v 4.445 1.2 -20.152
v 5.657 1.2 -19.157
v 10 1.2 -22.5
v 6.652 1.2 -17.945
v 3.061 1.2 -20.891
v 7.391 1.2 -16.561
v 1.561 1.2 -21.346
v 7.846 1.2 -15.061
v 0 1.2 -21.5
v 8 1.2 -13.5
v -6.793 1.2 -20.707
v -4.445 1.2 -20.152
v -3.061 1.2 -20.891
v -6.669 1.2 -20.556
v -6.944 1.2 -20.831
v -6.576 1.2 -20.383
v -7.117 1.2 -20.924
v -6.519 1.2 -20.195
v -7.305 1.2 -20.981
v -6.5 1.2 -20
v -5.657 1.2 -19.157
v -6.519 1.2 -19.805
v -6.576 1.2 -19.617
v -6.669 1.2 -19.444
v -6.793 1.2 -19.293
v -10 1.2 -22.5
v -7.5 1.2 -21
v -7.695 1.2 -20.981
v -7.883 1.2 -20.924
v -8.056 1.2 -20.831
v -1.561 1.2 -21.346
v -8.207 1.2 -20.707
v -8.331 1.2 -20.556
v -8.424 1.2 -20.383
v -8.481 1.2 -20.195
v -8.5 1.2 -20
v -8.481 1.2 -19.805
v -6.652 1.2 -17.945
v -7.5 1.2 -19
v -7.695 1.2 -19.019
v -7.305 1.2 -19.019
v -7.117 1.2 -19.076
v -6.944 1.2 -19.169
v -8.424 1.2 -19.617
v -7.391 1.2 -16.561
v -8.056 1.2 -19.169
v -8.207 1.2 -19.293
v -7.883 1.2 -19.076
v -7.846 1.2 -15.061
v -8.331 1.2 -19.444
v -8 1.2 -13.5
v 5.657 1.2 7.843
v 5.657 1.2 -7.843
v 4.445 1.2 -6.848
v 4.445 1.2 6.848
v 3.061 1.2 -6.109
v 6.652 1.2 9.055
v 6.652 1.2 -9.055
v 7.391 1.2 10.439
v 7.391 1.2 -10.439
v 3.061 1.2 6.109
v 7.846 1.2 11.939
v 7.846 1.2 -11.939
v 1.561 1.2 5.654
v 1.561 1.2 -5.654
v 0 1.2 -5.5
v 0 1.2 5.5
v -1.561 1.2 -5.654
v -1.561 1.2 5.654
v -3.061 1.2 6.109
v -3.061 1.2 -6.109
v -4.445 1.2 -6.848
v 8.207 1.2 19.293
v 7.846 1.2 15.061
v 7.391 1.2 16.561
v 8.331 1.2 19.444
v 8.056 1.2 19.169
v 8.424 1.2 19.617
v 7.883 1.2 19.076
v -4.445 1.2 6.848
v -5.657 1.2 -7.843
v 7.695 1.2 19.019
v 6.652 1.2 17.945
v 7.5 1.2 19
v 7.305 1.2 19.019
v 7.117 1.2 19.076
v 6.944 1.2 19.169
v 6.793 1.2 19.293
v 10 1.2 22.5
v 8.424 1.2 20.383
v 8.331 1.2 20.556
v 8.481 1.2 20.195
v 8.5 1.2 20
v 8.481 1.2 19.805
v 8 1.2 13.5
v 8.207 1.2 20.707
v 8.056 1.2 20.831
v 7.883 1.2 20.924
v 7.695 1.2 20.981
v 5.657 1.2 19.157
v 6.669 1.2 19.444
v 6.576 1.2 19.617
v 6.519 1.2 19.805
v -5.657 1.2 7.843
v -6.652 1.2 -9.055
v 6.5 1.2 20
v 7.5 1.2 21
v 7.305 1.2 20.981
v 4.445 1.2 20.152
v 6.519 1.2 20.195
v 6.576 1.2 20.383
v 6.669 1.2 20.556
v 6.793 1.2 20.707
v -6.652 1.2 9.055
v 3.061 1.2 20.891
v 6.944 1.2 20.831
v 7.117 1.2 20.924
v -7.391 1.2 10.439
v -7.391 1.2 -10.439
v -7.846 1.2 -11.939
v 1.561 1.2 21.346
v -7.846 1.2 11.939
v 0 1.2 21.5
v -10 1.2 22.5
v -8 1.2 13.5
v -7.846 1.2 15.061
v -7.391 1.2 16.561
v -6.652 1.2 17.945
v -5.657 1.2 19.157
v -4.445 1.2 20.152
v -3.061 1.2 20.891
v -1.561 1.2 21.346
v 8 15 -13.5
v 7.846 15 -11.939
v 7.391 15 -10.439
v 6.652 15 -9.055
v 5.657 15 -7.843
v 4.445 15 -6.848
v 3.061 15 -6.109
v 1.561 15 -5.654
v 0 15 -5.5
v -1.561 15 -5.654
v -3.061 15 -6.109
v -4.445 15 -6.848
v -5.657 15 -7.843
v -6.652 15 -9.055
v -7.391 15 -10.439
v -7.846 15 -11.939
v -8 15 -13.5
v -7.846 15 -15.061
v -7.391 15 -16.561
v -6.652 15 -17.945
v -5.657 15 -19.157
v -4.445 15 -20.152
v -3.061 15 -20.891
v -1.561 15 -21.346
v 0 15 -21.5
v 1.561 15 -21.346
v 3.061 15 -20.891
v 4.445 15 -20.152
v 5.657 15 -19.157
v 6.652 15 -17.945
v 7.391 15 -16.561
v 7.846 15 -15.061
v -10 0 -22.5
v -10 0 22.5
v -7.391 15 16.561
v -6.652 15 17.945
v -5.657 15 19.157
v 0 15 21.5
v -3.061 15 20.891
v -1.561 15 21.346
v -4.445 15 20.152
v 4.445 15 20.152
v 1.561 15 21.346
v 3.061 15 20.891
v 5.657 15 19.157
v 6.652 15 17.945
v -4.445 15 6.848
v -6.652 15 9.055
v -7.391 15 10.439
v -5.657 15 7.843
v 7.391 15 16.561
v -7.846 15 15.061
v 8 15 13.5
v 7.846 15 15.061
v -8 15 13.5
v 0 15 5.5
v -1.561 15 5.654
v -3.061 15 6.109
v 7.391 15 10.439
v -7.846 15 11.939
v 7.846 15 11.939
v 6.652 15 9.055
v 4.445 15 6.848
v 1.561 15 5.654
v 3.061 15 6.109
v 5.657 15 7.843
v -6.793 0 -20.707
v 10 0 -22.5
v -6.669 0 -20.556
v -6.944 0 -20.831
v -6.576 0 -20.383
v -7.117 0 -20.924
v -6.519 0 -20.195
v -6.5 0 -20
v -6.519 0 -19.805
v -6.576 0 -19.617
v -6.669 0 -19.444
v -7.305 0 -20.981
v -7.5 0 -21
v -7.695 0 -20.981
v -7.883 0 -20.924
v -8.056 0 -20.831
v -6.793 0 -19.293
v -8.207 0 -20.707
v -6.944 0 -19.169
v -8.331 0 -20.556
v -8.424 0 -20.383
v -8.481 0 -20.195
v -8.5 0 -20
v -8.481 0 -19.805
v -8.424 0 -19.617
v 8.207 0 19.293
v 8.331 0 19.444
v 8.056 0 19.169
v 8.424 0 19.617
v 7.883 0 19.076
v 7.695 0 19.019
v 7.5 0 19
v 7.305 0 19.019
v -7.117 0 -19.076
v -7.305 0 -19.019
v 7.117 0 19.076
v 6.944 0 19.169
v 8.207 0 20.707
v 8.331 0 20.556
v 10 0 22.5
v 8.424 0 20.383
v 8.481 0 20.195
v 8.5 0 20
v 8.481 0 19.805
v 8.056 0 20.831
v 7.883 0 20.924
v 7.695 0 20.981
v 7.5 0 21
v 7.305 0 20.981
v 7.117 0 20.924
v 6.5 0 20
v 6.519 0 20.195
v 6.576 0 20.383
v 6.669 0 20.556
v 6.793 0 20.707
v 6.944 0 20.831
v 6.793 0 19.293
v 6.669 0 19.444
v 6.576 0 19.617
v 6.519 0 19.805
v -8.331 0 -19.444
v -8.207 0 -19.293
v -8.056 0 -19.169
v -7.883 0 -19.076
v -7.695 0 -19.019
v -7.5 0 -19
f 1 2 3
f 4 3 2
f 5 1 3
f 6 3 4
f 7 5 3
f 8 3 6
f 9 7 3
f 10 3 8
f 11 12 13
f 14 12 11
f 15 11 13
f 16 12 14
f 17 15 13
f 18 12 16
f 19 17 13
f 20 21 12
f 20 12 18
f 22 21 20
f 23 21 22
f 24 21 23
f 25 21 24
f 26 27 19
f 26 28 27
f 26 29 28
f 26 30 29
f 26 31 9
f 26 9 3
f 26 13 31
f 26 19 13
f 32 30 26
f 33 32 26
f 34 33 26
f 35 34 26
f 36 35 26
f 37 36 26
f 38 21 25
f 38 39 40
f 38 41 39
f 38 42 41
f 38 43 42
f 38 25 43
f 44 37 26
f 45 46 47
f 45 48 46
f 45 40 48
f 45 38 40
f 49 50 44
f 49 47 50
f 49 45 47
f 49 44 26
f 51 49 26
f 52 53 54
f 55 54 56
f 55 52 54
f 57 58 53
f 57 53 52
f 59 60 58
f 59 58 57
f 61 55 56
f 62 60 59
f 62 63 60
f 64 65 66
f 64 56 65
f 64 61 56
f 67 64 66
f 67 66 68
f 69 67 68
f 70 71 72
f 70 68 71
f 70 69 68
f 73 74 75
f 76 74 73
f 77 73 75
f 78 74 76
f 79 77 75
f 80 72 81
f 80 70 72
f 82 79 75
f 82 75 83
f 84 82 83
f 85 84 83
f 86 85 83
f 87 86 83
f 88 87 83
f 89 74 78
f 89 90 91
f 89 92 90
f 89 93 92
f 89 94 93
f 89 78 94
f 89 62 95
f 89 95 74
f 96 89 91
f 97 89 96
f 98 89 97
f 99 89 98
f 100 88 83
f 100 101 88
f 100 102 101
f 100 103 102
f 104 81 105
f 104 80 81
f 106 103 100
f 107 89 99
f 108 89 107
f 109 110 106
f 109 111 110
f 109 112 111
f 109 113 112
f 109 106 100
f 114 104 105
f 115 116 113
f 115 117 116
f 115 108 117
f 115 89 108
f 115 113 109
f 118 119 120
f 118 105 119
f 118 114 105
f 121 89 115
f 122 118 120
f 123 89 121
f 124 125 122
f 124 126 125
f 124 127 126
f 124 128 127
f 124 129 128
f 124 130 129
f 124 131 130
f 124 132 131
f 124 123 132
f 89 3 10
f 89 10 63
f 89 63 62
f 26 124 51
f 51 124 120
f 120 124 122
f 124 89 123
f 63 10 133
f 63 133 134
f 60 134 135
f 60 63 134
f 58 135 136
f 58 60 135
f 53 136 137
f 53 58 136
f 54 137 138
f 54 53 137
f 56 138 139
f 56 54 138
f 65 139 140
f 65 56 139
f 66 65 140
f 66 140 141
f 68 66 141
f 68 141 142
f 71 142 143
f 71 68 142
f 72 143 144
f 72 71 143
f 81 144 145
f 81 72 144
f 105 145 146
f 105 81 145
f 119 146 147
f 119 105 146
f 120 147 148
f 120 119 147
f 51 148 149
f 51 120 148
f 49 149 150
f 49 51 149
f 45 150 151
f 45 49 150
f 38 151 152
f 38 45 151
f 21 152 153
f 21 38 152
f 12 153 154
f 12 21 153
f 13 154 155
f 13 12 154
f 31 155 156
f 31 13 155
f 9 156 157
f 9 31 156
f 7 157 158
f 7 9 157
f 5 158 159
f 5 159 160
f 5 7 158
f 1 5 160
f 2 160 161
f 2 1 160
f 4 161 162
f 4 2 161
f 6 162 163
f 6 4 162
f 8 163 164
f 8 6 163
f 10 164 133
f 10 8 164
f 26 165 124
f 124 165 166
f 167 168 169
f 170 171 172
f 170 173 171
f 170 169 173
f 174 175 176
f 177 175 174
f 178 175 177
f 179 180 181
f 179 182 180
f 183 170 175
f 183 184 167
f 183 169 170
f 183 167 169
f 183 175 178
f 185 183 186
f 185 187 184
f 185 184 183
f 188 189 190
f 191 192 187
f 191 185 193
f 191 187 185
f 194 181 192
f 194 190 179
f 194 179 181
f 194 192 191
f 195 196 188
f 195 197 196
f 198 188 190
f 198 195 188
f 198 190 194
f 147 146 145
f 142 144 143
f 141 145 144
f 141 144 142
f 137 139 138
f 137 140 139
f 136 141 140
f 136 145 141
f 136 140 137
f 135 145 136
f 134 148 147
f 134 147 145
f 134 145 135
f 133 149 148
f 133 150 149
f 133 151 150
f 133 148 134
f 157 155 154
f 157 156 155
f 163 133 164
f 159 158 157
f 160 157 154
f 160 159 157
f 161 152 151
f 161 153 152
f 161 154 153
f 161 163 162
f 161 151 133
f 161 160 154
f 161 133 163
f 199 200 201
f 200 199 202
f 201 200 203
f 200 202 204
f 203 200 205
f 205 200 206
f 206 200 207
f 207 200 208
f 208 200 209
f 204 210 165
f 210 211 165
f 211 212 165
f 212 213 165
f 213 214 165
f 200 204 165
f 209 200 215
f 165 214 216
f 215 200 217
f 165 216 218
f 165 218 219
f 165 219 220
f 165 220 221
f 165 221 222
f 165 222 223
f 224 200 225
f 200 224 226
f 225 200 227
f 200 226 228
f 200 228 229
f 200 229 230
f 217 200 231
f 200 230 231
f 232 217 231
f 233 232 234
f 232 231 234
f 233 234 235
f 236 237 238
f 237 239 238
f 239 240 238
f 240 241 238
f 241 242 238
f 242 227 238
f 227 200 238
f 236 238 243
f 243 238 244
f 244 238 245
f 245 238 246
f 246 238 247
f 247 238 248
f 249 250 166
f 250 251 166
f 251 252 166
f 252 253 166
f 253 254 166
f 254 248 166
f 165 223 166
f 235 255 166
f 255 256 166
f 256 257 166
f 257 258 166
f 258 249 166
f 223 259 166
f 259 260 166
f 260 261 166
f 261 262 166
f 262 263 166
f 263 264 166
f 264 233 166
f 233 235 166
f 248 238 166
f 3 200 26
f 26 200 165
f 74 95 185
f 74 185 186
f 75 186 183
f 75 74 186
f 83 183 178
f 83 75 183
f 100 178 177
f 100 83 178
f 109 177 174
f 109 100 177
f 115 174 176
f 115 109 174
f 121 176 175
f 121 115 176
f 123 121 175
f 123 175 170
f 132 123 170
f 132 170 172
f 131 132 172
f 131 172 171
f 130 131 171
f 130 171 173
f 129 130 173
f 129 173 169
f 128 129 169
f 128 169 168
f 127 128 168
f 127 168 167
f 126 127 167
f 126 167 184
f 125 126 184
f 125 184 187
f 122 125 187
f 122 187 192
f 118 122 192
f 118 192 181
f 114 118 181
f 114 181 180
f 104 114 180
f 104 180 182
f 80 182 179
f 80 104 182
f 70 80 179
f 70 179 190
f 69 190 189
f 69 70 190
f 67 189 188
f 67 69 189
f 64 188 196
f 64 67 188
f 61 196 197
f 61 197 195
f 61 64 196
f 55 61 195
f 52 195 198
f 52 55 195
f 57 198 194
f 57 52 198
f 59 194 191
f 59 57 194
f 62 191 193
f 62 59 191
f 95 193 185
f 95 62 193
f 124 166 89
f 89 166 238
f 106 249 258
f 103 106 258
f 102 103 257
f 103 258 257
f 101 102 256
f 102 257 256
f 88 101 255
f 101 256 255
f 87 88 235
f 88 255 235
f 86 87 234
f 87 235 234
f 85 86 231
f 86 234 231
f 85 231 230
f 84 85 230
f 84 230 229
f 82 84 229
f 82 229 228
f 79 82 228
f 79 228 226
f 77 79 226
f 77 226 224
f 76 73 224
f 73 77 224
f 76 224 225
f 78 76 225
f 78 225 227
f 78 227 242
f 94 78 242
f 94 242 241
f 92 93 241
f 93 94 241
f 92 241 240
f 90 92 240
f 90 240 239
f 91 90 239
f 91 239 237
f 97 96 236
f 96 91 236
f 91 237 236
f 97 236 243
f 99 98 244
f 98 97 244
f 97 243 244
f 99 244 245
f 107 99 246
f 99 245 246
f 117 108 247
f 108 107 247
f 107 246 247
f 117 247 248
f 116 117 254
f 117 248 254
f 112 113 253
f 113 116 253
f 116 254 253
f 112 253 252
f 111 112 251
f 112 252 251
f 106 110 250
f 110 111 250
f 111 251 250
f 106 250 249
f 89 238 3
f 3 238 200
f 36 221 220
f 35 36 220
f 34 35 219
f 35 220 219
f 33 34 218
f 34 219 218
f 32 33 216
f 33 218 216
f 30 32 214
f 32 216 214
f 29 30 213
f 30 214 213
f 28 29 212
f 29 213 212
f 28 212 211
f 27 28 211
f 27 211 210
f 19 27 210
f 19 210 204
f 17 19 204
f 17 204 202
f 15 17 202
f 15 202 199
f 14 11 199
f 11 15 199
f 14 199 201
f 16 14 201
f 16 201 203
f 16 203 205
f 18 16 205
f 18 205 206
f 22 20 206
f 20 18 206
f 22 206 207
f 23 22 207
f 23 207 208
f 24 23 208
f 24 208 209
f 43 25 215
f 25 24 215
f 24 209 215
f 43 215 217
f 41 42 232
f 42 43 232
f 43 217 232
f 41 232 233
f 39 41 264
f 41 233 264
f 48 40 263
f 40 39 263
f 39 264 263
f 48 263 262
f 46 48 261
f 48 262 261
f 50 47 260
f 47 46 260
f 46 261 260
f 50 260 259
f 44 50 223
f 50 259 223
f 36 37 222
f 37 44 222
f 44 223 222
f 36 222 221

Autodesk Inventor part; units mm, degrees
ref_plane "YZ Plane" through (0, 0, 0) normal (1, 0, 0) x (0, 1, 0)
ref_plane "XZ Plane" through (0, 0, 0) normal (0, 1, 0) x (-1, 0, 0)
ref_plane "XY Plane" through (0, 0, 0) normal (0, 0, 1) x (1, 0, 0)
sketch "스케치1" plane through (0, 0, 0) normal (0, 1, 0) x (-1, 0, 0)
  line L0 (10, 22.5) -> (-10, 22.5)
  line L1 (-10, 22.5) -> (-10, -22.5)
  line L2 (-10, -22.5) -> (10, -22.5)
  line L3 (10, -22.5) -> (10, 22.5)
  line L4 (10, 22.5) -> (-10, -22.5) construction
  line L5 (-10, 22.5) -> (10, -22.5) construction
  line L6 (-7.5, 20) -> (-7.5, -20) construction
  line L7 (0, 13.5) -> (0, -13.5) construction
  circle A0 centre (0, 13.5) radius 8
  circle A1 centre (0, -13.5) radius 8
  line L8 (7.5, 20) -> (7.5, -20) construction
  circle A2 centre (-7.5, 20) radius 1
  circle A3 centre (7.5, -20) radius 1
  point P0 (0, 0)
  point P1 (0, 0)
  dimension "d0" = 20
  dimension "d1" = 45
  dimension "d2" = 27
  dimension "d3" = 40
  dimension "d4" = 20
  dimension "d5" = 10
  dimension "d6" = 9
  dimension "d7" = 16
  dimension "d8" = 16
  dimension "d9" = 40
  dimension "d10" = 20
  dimension "d11" = 15
  dimension "d12" = 7.5
  dimension "d13" = 2
  dimension "d14" = 2
extrude "돌출1" add sketch "스케치1" along normal blind 1.2 contours L3 L2 L1 L0 | A0 | A1
sketch "스케치2" plane through (0, 1.2, 0) normal (0, 1, 0) x (1, 0, 0)
  line L0 (0, -13.5) -> (0, 13.5)
  line L1 (-10, 22.5) -> (-10, -22.5) projected
  line L2 (10, -22.5) -> (10, 22.5) projected
  circle A0 centre (0, -13.5) radius 8
  circle A1 centre (0, 13.5) radius 8
  point P0 (0, 0)
  point P1 (-10, 0)
  dimension "d17" = 27
  dimension "d20" = 10
  dimension "d21" = 13.5
  dimension "d22" = 16
  dimension "d23" = 16
extrude "돌출2" add sketch "스케치2" along normal blind 13.8
properties part number "초음파센서"
